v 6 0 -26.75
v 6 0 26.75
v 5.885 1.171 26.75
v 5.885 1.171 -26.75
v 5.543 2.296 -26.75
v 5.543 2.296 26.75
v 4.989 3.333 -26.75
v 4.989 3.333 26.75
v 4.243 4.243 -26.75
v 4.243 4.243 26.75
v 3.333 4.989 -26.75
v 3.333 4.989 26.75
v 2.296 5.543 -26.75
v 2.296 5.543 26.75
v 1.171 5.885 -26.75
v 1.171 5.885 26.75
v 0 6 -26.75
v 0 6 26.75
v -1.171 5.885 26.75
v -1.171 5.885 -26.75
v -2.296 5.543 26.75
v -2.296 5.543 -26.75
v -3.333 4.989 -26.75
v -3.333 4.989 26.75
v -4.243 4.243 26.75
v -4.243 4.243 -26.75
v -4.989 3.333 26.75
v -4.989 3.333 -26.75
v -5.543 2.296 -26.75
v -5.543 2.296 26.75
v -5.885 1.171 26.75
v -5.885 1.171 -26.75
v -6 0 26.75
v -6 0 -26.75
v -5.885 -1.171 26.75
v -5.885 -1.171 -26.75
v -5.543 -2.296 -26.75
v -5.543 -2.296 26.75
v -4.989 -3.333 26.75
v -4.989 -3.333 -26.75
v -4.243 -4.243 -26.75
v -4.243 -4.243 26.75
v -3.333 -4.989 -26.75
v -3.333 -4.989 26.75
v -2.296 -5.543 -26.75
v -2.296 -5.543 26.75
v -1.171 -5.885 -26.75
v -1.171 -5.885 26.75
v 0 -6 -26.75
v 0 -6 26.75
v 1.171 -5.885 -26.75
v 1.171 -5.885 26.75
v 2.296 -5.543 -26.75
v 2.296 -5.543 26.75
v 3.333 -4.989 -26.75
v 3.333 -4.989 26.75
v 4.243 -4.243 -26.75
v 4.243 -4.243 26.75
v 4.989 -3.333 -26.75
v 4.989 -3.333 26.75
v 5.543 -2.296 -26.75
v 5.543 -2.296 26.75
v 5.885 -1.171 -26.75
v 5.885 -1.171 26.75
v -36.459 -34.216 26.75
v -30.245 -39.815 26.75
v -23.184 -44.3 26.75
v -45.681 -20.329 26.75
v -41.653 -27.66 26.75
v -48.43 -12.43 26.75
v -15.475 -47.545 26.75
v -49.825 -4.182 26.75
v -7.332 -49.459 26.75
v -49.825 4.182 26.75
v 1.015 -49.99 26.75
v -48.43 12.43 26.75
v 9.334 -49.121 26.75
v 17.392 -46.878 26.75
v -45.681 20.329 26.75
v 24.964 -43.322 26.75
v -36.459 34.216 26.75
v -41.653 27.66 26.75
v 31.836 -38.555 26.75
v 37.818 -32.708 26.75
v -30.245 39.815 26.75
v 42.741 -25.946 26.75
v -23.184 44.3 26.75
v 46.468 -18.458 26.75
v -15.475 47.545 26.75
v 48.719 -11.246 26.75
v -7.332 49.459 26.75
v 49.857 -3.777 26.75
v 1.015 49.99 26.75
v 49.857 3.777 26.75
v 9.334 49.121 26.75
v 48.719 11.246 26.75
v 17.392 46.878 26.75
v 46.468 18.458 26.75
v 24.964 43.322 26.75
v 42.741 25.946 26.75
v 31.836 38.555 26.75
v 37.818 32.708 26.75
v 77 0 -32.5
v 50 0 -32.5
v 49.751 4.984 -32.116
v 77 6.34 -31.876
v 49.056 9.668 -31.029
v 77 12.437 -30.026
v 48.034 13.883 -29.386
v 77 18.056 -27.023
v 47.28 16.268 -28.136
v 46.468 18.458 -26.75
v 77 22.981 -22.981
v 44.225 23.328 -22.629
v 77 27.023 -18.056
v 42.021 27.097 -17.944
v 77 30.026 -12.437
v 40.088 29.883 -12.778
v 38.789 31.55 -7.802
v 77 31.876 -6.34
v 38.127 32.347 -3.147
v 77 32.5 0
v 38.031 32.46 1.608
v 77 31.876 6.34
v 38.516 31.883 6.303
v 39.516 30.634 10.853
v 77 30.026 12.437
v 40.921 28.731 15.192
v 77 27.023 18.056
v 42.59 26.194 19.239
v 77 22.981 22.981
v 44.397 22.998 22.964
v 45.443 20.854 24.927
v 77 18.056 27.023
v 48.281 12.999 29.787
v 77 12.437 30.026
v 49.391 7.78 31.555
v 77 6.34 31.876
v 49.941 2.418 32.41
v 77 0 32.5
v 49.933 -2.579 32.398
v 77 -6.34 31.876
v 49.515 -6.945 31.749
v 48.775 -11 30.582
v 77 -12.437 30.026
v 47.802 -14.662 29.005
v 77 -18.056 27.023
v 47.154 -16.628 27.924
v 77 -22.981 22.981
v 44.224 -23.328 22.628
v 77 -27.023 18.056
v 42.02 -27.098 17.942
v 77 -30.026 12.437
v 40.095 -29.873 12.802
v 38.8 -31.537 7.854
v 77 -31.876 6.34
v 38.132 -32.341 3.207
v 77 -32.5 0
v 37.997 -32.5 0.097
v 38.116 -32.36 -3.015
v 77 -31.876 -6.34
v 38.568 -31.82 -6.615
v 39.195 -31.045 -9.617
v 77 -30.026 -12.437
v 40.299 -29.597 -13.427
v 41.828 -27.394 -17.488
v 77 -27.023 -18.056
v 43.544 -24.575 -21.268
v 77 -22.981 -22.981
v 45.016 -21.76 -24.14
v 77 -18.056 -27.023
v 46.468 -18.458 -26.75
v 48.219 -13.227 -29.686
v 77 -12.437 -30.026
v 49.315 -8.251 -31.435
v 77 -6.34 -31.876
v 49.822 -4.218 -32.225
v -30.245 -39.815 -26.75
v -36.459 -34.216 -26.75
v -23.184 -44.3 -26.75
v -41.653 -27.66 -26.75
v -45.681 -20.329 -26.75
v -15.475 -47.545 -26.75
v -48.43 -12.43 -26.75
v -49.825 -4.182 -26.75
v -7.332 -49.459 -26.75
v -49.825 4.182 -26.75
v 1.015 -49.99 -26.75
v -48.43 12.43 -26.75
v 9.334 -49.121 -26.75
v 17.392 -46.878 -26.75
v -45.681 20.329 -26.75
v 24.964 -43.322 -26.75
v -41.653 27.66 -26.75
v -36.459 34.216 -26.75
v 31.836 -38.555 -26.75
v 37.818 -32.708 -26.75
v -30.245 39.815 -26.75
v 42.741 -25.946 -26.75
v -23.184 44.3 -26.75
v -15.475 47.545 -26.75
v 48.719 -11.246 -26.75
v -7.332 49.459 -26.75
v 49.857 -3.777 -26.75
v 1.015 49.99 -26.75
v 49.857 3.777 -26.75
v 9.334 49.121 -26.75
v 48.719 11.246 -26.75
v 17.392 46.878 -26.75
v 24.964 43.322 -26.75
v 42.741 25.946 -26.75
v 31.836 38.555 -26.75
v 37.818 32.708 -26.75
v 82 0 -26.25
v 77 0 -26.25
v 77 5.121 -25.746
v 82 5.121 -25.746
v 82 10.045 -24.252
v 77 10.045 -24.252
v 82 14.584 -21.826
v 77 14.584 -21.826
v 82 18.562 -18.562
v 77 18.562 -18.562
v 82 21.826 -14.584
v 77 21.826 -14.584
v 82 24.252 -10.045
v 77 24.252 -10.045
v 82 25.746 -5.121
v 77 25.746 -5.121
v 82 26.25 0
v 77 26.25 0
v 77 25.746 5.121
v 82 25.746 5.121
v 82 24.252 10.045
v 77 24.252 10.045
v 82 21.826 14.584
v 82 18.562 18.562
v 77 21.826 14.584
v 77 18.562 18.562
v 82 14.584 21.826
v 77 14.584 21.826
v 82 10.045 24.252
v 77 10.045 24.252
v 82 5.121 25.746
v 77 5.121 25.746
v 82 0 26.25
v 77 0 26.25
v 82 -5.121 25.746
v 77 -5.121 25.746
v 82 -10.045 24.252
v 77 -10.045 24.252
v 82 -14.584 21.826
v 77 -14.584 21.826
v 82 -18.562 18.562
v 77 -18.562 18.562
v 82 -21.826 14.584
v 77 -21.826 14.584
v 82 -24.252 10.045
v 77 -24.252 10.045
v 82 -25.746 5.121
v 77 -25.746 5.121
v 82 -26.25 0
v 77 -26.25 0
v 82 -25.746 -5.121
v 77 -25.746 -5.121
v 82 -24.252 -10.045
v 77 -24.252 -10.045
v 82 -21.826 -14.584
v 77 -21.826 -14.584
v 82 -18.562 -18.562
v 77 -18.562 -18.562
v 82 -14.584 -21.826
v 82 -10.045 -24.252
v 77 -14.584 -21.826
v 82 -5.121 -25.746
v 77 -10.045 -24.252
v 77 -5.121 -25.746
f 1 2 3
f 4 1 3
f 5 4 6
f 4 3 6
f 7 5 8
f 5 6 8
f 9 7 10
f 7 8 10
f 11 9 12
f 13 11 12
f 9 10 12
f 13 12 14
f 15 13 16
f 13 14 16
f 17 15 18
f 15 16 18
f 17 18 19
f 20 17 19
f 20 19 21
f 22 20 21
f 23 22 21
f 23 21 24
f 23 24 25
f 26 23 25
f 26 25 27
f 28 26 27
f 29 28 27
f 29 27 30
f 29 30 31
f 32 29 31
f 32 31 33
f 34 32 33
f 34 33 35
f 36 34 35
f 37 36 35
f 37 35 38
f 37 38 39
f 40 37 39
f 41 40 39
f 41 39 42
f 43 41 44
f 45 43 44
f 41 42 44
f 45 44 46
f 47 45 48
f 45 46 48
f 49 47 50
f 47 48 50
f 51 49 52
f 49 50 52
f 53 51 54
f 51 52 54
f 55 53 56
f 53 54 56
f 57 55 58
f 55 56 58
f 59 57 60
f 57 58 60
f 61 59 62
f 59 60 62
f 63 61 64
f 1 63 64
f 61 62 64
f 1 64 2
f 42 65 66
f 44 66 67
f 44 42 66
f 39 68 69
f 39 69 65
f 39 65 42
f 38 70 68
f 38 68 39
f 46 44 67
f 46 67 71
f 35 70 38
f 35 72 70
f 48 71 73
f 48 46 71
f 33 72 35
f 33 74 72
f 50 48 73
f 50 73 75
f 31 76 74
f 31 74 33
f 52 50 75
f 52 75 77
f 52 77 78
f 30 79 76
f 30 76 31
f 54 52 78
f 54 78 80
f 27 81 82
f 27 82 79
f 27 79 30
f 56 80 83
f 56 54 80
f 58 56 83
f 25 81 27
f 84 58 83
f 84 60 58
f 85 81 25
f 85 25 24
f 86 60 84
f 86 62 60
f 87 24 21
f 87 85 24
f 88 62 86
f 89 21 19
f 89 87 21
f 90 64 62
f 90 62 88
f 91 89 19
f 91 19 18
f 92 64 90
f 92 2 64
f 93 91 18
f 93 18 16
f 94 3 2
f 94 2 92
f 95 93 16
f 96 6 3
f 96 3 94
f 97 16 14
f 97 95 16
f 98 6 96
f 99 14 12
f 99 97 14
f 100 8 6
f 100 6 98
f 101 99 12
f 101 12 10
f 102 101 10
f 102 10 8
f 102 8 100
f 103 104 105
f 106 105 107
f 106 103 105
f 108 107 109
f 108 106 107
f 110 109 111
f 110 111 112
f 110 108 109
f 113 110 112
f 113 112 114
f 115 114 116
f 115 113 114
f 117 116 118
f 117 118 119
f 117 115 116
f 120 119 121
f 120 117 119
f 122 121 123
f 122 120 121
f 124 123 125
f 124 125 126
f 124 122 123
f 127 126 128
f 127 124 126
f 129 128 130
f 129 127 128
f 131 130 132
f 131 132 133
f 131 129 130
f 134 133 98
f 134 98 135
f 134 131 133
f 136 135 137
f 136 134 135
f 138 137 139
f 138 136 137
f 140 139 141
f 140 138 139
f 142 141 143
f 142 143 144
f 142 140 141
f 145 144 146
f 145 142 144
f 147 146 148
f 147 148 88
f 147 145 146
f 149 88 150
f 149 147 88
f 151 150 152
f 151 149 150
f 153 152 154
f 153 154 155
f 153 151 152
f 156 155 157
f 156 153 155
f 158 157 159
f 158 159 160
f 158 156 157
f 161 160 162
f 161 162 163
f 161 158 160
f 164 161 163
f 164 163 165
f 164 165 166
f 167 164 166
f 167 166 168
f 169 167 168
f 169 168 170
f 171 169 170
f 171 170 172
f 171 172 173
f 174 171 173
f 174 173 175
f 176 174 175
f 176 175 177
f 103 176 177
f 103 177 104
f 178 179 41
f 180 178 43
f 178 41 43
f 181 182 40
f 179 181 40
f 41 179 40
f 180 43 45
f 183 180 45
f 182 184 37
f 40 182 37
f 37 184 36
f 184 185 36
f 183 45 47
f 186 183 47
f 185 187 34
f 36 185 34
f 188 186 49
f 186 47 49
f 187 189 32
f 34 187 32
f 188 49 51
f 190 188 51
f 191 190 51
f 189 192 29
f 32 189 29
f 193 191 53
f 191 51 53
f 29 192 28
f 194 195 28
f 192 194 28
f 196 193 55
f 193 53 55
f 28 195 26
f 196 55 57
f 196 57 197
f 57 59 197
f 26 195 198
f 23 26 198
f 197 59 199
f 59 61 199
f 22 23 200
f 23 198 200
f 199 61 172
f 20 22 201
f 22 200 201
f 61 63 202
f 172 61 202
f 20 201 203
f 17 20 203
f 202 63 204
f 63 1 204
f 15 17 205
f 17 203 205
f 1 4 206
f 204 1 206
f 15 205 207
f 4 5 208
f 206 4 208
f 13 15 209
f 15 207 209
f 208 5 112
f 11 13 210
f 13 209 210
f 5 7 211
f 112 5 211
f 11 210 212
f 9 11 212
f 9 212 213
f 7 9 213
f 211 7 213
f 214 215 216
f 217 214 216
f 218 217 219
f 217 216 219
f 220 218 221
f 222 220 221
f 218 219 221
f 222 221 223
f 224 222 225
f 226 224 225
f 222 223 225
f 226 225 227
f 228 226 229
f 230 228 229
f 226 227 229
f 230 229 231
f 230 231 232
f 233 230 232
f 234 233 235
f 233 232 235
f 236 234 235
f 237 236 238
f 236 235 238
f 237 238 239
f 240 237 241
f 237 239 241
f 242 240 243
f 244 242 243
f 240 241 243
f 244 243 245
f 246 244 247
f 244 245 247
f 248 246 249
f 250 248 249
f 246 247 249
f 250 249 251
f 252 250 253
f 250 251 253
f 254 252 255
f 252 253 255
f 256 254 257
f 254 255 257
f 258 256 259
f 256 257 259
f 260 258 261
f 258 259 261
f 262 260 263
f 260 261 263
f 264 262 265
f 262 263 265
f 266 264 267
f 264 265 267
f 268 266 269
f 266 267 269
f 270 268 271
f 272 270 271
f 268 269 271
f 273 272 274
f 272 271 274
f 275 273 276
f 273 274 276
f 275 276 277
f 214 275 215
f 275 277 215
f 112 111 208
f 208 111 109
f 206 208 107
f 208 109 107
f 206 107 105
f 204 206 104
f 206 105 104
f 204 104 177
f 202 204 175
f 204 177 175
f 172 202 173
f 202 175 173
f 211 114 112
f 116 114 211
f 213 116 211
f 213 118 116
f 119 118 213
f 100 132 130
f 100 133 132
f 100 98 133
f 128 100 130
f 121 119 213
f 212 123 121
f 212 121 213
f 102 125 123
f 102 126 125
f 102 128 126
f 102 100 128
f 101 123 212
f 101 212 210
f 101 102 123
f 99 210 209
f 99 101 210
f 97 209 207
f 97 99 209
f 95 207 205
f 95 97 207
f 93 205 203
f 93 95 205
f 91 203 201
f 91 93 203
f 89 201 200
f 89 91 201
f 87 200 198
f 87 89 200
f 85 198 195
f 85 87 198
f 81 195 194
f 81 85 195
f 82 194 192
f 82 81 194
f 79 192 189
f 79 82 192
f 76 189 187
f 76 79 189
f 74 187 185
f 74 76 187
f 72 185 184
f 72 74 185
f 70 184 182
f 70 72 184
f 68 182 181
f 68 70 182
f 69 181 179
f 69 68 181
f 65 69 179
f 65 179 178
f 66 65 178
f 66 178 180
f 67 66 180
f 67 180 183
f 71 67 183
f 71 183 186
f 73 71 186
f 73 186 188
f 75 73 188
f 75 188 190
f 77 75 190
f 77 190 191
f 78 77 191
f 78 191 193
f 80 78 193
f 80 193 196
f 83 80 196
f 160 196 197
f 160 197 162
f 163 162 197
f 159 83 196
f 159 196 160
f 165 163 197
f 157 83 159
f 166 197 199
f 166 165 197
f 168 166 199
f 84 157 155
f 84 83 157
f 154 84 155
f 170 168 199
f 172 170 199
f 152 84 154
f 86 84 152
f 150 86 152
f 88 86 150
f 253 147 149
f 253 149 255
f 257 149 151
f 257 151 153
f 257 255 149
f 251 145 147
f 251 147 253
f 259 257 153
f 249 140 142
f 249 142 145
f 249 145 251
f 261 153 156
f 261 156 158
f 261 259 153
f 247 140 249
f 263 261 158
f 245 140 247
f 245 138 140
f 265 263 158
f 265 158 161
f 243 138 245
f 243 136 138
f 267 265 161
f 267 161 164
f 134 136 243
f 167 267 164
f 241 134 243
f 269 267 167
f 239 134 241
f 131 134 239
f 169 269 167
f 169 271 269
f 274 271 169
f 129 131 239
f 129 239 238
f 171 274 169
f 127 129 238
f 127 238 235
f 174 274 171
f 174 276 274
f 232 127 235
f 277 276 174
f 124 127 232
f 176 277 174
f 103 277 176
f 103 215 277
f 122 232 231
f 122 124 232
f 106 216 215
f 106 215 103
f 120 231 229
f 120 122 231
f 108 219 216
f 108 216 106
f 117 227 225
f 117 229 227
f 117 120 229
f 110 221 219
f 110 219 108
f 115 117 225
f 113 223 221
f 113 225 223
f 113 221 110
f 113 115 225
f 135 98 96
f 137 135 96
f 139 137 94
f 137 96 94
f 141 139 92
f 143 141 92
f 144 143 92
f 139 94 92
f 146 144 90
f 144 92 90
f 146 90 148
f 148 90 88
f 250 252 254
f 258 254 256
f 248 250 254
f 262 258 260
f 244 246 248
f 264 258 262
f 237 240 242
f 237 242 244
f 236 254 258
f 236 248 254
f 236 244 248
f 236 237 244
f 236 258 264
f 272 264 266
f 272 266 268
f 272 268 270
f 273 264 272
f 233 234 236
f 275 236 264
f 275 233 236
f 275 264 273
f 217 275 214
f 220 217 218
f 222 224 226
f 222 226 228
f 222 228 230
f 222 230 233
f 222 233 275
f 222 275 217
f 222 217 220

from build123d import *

# Parameters (mm, degrees)
ESBO_O1_R                     = 50
RESSALTO_EXTRUS_O1_DEPTH      = 26.75
RESSALTO_EXTRUS_O3_REACH      = 141.085
RESSALTO_EXTRUS_O3_END_RADIUS = 50
ESBO_O2_R                     = 32.5
ESBO_O3_R                     = 26.25
RESSALTO_EXTRUS_O4_DEPTH      = 5
ESBO_O4_R                     = 6
CORTE_EXTRUS_O1_DEPTH         = 113.8475189


with BuildPart() as part:
    # Esboço1 → Ressalto-extrusão1 (new, symmetric)
    with BuildSketch(Plane.XY):
        Circle(ESBO_O1_R)
    extrude(amount=RESSALTO_EXTRUS_O1_DEPTH, both=True)

    # Ressalto-extrusão3: up to this cylinder (the profile starts outside it)
    ressalto_extrus_o3_end = Plane(origin=(0, 0, 0), z_dir=(0, 0, -1)) * Cylinder(RESSALTO_EXTRUS_O3_END_RADIUS, 383.17, mode=Mode.PRIVATE)
    # Esboço2 → Ressalto-extrusão3 (add, up to the surface)
    with BuildSketch(Plane(origin=(77, 0, 0), x_dir=(0, 0, -1), z_dir=(1, 0, 0)), mode=Mode.PRIVATE) as ressalto_extrus_o3_sk1:
        Circle(ESBO_O2_R)
    ressalto_extrus_o3_tool1 = extrude(ressalto_extrus_o3_sk1.sketch, amount=-RESSALTO_EXTRUS_O3_REACH, mode=Mode.PRIVATE) - ressalto_extrus_o3_end
    add(ressalto_extrus_o3_tool1.solids().sort_by_distance((77, 0, 0))[0])

    # Esboço3 → Ressalto-extrusão4 (add)
    with BuildSketch(Plane(origin=(77, 0, 0), x_dir=(0, 0, -1), z_dir=(1, 0, 0))):
        Circle(ESBO_O3_R)
    extrude(amount=RESSALTO_EXTRUS_O4_DEPTH)

    # Esboço4 → Corte-extrusão1 (cut, through all)
    with BuildSketch(Plane.XY.offset(26.75)):
        Circle(ESBO_O4_R)
    extrude(amount=-CORTE_EXTRUS_O1_DEPTH, mode=Mode.SUBTRACT)


solid = part.part
